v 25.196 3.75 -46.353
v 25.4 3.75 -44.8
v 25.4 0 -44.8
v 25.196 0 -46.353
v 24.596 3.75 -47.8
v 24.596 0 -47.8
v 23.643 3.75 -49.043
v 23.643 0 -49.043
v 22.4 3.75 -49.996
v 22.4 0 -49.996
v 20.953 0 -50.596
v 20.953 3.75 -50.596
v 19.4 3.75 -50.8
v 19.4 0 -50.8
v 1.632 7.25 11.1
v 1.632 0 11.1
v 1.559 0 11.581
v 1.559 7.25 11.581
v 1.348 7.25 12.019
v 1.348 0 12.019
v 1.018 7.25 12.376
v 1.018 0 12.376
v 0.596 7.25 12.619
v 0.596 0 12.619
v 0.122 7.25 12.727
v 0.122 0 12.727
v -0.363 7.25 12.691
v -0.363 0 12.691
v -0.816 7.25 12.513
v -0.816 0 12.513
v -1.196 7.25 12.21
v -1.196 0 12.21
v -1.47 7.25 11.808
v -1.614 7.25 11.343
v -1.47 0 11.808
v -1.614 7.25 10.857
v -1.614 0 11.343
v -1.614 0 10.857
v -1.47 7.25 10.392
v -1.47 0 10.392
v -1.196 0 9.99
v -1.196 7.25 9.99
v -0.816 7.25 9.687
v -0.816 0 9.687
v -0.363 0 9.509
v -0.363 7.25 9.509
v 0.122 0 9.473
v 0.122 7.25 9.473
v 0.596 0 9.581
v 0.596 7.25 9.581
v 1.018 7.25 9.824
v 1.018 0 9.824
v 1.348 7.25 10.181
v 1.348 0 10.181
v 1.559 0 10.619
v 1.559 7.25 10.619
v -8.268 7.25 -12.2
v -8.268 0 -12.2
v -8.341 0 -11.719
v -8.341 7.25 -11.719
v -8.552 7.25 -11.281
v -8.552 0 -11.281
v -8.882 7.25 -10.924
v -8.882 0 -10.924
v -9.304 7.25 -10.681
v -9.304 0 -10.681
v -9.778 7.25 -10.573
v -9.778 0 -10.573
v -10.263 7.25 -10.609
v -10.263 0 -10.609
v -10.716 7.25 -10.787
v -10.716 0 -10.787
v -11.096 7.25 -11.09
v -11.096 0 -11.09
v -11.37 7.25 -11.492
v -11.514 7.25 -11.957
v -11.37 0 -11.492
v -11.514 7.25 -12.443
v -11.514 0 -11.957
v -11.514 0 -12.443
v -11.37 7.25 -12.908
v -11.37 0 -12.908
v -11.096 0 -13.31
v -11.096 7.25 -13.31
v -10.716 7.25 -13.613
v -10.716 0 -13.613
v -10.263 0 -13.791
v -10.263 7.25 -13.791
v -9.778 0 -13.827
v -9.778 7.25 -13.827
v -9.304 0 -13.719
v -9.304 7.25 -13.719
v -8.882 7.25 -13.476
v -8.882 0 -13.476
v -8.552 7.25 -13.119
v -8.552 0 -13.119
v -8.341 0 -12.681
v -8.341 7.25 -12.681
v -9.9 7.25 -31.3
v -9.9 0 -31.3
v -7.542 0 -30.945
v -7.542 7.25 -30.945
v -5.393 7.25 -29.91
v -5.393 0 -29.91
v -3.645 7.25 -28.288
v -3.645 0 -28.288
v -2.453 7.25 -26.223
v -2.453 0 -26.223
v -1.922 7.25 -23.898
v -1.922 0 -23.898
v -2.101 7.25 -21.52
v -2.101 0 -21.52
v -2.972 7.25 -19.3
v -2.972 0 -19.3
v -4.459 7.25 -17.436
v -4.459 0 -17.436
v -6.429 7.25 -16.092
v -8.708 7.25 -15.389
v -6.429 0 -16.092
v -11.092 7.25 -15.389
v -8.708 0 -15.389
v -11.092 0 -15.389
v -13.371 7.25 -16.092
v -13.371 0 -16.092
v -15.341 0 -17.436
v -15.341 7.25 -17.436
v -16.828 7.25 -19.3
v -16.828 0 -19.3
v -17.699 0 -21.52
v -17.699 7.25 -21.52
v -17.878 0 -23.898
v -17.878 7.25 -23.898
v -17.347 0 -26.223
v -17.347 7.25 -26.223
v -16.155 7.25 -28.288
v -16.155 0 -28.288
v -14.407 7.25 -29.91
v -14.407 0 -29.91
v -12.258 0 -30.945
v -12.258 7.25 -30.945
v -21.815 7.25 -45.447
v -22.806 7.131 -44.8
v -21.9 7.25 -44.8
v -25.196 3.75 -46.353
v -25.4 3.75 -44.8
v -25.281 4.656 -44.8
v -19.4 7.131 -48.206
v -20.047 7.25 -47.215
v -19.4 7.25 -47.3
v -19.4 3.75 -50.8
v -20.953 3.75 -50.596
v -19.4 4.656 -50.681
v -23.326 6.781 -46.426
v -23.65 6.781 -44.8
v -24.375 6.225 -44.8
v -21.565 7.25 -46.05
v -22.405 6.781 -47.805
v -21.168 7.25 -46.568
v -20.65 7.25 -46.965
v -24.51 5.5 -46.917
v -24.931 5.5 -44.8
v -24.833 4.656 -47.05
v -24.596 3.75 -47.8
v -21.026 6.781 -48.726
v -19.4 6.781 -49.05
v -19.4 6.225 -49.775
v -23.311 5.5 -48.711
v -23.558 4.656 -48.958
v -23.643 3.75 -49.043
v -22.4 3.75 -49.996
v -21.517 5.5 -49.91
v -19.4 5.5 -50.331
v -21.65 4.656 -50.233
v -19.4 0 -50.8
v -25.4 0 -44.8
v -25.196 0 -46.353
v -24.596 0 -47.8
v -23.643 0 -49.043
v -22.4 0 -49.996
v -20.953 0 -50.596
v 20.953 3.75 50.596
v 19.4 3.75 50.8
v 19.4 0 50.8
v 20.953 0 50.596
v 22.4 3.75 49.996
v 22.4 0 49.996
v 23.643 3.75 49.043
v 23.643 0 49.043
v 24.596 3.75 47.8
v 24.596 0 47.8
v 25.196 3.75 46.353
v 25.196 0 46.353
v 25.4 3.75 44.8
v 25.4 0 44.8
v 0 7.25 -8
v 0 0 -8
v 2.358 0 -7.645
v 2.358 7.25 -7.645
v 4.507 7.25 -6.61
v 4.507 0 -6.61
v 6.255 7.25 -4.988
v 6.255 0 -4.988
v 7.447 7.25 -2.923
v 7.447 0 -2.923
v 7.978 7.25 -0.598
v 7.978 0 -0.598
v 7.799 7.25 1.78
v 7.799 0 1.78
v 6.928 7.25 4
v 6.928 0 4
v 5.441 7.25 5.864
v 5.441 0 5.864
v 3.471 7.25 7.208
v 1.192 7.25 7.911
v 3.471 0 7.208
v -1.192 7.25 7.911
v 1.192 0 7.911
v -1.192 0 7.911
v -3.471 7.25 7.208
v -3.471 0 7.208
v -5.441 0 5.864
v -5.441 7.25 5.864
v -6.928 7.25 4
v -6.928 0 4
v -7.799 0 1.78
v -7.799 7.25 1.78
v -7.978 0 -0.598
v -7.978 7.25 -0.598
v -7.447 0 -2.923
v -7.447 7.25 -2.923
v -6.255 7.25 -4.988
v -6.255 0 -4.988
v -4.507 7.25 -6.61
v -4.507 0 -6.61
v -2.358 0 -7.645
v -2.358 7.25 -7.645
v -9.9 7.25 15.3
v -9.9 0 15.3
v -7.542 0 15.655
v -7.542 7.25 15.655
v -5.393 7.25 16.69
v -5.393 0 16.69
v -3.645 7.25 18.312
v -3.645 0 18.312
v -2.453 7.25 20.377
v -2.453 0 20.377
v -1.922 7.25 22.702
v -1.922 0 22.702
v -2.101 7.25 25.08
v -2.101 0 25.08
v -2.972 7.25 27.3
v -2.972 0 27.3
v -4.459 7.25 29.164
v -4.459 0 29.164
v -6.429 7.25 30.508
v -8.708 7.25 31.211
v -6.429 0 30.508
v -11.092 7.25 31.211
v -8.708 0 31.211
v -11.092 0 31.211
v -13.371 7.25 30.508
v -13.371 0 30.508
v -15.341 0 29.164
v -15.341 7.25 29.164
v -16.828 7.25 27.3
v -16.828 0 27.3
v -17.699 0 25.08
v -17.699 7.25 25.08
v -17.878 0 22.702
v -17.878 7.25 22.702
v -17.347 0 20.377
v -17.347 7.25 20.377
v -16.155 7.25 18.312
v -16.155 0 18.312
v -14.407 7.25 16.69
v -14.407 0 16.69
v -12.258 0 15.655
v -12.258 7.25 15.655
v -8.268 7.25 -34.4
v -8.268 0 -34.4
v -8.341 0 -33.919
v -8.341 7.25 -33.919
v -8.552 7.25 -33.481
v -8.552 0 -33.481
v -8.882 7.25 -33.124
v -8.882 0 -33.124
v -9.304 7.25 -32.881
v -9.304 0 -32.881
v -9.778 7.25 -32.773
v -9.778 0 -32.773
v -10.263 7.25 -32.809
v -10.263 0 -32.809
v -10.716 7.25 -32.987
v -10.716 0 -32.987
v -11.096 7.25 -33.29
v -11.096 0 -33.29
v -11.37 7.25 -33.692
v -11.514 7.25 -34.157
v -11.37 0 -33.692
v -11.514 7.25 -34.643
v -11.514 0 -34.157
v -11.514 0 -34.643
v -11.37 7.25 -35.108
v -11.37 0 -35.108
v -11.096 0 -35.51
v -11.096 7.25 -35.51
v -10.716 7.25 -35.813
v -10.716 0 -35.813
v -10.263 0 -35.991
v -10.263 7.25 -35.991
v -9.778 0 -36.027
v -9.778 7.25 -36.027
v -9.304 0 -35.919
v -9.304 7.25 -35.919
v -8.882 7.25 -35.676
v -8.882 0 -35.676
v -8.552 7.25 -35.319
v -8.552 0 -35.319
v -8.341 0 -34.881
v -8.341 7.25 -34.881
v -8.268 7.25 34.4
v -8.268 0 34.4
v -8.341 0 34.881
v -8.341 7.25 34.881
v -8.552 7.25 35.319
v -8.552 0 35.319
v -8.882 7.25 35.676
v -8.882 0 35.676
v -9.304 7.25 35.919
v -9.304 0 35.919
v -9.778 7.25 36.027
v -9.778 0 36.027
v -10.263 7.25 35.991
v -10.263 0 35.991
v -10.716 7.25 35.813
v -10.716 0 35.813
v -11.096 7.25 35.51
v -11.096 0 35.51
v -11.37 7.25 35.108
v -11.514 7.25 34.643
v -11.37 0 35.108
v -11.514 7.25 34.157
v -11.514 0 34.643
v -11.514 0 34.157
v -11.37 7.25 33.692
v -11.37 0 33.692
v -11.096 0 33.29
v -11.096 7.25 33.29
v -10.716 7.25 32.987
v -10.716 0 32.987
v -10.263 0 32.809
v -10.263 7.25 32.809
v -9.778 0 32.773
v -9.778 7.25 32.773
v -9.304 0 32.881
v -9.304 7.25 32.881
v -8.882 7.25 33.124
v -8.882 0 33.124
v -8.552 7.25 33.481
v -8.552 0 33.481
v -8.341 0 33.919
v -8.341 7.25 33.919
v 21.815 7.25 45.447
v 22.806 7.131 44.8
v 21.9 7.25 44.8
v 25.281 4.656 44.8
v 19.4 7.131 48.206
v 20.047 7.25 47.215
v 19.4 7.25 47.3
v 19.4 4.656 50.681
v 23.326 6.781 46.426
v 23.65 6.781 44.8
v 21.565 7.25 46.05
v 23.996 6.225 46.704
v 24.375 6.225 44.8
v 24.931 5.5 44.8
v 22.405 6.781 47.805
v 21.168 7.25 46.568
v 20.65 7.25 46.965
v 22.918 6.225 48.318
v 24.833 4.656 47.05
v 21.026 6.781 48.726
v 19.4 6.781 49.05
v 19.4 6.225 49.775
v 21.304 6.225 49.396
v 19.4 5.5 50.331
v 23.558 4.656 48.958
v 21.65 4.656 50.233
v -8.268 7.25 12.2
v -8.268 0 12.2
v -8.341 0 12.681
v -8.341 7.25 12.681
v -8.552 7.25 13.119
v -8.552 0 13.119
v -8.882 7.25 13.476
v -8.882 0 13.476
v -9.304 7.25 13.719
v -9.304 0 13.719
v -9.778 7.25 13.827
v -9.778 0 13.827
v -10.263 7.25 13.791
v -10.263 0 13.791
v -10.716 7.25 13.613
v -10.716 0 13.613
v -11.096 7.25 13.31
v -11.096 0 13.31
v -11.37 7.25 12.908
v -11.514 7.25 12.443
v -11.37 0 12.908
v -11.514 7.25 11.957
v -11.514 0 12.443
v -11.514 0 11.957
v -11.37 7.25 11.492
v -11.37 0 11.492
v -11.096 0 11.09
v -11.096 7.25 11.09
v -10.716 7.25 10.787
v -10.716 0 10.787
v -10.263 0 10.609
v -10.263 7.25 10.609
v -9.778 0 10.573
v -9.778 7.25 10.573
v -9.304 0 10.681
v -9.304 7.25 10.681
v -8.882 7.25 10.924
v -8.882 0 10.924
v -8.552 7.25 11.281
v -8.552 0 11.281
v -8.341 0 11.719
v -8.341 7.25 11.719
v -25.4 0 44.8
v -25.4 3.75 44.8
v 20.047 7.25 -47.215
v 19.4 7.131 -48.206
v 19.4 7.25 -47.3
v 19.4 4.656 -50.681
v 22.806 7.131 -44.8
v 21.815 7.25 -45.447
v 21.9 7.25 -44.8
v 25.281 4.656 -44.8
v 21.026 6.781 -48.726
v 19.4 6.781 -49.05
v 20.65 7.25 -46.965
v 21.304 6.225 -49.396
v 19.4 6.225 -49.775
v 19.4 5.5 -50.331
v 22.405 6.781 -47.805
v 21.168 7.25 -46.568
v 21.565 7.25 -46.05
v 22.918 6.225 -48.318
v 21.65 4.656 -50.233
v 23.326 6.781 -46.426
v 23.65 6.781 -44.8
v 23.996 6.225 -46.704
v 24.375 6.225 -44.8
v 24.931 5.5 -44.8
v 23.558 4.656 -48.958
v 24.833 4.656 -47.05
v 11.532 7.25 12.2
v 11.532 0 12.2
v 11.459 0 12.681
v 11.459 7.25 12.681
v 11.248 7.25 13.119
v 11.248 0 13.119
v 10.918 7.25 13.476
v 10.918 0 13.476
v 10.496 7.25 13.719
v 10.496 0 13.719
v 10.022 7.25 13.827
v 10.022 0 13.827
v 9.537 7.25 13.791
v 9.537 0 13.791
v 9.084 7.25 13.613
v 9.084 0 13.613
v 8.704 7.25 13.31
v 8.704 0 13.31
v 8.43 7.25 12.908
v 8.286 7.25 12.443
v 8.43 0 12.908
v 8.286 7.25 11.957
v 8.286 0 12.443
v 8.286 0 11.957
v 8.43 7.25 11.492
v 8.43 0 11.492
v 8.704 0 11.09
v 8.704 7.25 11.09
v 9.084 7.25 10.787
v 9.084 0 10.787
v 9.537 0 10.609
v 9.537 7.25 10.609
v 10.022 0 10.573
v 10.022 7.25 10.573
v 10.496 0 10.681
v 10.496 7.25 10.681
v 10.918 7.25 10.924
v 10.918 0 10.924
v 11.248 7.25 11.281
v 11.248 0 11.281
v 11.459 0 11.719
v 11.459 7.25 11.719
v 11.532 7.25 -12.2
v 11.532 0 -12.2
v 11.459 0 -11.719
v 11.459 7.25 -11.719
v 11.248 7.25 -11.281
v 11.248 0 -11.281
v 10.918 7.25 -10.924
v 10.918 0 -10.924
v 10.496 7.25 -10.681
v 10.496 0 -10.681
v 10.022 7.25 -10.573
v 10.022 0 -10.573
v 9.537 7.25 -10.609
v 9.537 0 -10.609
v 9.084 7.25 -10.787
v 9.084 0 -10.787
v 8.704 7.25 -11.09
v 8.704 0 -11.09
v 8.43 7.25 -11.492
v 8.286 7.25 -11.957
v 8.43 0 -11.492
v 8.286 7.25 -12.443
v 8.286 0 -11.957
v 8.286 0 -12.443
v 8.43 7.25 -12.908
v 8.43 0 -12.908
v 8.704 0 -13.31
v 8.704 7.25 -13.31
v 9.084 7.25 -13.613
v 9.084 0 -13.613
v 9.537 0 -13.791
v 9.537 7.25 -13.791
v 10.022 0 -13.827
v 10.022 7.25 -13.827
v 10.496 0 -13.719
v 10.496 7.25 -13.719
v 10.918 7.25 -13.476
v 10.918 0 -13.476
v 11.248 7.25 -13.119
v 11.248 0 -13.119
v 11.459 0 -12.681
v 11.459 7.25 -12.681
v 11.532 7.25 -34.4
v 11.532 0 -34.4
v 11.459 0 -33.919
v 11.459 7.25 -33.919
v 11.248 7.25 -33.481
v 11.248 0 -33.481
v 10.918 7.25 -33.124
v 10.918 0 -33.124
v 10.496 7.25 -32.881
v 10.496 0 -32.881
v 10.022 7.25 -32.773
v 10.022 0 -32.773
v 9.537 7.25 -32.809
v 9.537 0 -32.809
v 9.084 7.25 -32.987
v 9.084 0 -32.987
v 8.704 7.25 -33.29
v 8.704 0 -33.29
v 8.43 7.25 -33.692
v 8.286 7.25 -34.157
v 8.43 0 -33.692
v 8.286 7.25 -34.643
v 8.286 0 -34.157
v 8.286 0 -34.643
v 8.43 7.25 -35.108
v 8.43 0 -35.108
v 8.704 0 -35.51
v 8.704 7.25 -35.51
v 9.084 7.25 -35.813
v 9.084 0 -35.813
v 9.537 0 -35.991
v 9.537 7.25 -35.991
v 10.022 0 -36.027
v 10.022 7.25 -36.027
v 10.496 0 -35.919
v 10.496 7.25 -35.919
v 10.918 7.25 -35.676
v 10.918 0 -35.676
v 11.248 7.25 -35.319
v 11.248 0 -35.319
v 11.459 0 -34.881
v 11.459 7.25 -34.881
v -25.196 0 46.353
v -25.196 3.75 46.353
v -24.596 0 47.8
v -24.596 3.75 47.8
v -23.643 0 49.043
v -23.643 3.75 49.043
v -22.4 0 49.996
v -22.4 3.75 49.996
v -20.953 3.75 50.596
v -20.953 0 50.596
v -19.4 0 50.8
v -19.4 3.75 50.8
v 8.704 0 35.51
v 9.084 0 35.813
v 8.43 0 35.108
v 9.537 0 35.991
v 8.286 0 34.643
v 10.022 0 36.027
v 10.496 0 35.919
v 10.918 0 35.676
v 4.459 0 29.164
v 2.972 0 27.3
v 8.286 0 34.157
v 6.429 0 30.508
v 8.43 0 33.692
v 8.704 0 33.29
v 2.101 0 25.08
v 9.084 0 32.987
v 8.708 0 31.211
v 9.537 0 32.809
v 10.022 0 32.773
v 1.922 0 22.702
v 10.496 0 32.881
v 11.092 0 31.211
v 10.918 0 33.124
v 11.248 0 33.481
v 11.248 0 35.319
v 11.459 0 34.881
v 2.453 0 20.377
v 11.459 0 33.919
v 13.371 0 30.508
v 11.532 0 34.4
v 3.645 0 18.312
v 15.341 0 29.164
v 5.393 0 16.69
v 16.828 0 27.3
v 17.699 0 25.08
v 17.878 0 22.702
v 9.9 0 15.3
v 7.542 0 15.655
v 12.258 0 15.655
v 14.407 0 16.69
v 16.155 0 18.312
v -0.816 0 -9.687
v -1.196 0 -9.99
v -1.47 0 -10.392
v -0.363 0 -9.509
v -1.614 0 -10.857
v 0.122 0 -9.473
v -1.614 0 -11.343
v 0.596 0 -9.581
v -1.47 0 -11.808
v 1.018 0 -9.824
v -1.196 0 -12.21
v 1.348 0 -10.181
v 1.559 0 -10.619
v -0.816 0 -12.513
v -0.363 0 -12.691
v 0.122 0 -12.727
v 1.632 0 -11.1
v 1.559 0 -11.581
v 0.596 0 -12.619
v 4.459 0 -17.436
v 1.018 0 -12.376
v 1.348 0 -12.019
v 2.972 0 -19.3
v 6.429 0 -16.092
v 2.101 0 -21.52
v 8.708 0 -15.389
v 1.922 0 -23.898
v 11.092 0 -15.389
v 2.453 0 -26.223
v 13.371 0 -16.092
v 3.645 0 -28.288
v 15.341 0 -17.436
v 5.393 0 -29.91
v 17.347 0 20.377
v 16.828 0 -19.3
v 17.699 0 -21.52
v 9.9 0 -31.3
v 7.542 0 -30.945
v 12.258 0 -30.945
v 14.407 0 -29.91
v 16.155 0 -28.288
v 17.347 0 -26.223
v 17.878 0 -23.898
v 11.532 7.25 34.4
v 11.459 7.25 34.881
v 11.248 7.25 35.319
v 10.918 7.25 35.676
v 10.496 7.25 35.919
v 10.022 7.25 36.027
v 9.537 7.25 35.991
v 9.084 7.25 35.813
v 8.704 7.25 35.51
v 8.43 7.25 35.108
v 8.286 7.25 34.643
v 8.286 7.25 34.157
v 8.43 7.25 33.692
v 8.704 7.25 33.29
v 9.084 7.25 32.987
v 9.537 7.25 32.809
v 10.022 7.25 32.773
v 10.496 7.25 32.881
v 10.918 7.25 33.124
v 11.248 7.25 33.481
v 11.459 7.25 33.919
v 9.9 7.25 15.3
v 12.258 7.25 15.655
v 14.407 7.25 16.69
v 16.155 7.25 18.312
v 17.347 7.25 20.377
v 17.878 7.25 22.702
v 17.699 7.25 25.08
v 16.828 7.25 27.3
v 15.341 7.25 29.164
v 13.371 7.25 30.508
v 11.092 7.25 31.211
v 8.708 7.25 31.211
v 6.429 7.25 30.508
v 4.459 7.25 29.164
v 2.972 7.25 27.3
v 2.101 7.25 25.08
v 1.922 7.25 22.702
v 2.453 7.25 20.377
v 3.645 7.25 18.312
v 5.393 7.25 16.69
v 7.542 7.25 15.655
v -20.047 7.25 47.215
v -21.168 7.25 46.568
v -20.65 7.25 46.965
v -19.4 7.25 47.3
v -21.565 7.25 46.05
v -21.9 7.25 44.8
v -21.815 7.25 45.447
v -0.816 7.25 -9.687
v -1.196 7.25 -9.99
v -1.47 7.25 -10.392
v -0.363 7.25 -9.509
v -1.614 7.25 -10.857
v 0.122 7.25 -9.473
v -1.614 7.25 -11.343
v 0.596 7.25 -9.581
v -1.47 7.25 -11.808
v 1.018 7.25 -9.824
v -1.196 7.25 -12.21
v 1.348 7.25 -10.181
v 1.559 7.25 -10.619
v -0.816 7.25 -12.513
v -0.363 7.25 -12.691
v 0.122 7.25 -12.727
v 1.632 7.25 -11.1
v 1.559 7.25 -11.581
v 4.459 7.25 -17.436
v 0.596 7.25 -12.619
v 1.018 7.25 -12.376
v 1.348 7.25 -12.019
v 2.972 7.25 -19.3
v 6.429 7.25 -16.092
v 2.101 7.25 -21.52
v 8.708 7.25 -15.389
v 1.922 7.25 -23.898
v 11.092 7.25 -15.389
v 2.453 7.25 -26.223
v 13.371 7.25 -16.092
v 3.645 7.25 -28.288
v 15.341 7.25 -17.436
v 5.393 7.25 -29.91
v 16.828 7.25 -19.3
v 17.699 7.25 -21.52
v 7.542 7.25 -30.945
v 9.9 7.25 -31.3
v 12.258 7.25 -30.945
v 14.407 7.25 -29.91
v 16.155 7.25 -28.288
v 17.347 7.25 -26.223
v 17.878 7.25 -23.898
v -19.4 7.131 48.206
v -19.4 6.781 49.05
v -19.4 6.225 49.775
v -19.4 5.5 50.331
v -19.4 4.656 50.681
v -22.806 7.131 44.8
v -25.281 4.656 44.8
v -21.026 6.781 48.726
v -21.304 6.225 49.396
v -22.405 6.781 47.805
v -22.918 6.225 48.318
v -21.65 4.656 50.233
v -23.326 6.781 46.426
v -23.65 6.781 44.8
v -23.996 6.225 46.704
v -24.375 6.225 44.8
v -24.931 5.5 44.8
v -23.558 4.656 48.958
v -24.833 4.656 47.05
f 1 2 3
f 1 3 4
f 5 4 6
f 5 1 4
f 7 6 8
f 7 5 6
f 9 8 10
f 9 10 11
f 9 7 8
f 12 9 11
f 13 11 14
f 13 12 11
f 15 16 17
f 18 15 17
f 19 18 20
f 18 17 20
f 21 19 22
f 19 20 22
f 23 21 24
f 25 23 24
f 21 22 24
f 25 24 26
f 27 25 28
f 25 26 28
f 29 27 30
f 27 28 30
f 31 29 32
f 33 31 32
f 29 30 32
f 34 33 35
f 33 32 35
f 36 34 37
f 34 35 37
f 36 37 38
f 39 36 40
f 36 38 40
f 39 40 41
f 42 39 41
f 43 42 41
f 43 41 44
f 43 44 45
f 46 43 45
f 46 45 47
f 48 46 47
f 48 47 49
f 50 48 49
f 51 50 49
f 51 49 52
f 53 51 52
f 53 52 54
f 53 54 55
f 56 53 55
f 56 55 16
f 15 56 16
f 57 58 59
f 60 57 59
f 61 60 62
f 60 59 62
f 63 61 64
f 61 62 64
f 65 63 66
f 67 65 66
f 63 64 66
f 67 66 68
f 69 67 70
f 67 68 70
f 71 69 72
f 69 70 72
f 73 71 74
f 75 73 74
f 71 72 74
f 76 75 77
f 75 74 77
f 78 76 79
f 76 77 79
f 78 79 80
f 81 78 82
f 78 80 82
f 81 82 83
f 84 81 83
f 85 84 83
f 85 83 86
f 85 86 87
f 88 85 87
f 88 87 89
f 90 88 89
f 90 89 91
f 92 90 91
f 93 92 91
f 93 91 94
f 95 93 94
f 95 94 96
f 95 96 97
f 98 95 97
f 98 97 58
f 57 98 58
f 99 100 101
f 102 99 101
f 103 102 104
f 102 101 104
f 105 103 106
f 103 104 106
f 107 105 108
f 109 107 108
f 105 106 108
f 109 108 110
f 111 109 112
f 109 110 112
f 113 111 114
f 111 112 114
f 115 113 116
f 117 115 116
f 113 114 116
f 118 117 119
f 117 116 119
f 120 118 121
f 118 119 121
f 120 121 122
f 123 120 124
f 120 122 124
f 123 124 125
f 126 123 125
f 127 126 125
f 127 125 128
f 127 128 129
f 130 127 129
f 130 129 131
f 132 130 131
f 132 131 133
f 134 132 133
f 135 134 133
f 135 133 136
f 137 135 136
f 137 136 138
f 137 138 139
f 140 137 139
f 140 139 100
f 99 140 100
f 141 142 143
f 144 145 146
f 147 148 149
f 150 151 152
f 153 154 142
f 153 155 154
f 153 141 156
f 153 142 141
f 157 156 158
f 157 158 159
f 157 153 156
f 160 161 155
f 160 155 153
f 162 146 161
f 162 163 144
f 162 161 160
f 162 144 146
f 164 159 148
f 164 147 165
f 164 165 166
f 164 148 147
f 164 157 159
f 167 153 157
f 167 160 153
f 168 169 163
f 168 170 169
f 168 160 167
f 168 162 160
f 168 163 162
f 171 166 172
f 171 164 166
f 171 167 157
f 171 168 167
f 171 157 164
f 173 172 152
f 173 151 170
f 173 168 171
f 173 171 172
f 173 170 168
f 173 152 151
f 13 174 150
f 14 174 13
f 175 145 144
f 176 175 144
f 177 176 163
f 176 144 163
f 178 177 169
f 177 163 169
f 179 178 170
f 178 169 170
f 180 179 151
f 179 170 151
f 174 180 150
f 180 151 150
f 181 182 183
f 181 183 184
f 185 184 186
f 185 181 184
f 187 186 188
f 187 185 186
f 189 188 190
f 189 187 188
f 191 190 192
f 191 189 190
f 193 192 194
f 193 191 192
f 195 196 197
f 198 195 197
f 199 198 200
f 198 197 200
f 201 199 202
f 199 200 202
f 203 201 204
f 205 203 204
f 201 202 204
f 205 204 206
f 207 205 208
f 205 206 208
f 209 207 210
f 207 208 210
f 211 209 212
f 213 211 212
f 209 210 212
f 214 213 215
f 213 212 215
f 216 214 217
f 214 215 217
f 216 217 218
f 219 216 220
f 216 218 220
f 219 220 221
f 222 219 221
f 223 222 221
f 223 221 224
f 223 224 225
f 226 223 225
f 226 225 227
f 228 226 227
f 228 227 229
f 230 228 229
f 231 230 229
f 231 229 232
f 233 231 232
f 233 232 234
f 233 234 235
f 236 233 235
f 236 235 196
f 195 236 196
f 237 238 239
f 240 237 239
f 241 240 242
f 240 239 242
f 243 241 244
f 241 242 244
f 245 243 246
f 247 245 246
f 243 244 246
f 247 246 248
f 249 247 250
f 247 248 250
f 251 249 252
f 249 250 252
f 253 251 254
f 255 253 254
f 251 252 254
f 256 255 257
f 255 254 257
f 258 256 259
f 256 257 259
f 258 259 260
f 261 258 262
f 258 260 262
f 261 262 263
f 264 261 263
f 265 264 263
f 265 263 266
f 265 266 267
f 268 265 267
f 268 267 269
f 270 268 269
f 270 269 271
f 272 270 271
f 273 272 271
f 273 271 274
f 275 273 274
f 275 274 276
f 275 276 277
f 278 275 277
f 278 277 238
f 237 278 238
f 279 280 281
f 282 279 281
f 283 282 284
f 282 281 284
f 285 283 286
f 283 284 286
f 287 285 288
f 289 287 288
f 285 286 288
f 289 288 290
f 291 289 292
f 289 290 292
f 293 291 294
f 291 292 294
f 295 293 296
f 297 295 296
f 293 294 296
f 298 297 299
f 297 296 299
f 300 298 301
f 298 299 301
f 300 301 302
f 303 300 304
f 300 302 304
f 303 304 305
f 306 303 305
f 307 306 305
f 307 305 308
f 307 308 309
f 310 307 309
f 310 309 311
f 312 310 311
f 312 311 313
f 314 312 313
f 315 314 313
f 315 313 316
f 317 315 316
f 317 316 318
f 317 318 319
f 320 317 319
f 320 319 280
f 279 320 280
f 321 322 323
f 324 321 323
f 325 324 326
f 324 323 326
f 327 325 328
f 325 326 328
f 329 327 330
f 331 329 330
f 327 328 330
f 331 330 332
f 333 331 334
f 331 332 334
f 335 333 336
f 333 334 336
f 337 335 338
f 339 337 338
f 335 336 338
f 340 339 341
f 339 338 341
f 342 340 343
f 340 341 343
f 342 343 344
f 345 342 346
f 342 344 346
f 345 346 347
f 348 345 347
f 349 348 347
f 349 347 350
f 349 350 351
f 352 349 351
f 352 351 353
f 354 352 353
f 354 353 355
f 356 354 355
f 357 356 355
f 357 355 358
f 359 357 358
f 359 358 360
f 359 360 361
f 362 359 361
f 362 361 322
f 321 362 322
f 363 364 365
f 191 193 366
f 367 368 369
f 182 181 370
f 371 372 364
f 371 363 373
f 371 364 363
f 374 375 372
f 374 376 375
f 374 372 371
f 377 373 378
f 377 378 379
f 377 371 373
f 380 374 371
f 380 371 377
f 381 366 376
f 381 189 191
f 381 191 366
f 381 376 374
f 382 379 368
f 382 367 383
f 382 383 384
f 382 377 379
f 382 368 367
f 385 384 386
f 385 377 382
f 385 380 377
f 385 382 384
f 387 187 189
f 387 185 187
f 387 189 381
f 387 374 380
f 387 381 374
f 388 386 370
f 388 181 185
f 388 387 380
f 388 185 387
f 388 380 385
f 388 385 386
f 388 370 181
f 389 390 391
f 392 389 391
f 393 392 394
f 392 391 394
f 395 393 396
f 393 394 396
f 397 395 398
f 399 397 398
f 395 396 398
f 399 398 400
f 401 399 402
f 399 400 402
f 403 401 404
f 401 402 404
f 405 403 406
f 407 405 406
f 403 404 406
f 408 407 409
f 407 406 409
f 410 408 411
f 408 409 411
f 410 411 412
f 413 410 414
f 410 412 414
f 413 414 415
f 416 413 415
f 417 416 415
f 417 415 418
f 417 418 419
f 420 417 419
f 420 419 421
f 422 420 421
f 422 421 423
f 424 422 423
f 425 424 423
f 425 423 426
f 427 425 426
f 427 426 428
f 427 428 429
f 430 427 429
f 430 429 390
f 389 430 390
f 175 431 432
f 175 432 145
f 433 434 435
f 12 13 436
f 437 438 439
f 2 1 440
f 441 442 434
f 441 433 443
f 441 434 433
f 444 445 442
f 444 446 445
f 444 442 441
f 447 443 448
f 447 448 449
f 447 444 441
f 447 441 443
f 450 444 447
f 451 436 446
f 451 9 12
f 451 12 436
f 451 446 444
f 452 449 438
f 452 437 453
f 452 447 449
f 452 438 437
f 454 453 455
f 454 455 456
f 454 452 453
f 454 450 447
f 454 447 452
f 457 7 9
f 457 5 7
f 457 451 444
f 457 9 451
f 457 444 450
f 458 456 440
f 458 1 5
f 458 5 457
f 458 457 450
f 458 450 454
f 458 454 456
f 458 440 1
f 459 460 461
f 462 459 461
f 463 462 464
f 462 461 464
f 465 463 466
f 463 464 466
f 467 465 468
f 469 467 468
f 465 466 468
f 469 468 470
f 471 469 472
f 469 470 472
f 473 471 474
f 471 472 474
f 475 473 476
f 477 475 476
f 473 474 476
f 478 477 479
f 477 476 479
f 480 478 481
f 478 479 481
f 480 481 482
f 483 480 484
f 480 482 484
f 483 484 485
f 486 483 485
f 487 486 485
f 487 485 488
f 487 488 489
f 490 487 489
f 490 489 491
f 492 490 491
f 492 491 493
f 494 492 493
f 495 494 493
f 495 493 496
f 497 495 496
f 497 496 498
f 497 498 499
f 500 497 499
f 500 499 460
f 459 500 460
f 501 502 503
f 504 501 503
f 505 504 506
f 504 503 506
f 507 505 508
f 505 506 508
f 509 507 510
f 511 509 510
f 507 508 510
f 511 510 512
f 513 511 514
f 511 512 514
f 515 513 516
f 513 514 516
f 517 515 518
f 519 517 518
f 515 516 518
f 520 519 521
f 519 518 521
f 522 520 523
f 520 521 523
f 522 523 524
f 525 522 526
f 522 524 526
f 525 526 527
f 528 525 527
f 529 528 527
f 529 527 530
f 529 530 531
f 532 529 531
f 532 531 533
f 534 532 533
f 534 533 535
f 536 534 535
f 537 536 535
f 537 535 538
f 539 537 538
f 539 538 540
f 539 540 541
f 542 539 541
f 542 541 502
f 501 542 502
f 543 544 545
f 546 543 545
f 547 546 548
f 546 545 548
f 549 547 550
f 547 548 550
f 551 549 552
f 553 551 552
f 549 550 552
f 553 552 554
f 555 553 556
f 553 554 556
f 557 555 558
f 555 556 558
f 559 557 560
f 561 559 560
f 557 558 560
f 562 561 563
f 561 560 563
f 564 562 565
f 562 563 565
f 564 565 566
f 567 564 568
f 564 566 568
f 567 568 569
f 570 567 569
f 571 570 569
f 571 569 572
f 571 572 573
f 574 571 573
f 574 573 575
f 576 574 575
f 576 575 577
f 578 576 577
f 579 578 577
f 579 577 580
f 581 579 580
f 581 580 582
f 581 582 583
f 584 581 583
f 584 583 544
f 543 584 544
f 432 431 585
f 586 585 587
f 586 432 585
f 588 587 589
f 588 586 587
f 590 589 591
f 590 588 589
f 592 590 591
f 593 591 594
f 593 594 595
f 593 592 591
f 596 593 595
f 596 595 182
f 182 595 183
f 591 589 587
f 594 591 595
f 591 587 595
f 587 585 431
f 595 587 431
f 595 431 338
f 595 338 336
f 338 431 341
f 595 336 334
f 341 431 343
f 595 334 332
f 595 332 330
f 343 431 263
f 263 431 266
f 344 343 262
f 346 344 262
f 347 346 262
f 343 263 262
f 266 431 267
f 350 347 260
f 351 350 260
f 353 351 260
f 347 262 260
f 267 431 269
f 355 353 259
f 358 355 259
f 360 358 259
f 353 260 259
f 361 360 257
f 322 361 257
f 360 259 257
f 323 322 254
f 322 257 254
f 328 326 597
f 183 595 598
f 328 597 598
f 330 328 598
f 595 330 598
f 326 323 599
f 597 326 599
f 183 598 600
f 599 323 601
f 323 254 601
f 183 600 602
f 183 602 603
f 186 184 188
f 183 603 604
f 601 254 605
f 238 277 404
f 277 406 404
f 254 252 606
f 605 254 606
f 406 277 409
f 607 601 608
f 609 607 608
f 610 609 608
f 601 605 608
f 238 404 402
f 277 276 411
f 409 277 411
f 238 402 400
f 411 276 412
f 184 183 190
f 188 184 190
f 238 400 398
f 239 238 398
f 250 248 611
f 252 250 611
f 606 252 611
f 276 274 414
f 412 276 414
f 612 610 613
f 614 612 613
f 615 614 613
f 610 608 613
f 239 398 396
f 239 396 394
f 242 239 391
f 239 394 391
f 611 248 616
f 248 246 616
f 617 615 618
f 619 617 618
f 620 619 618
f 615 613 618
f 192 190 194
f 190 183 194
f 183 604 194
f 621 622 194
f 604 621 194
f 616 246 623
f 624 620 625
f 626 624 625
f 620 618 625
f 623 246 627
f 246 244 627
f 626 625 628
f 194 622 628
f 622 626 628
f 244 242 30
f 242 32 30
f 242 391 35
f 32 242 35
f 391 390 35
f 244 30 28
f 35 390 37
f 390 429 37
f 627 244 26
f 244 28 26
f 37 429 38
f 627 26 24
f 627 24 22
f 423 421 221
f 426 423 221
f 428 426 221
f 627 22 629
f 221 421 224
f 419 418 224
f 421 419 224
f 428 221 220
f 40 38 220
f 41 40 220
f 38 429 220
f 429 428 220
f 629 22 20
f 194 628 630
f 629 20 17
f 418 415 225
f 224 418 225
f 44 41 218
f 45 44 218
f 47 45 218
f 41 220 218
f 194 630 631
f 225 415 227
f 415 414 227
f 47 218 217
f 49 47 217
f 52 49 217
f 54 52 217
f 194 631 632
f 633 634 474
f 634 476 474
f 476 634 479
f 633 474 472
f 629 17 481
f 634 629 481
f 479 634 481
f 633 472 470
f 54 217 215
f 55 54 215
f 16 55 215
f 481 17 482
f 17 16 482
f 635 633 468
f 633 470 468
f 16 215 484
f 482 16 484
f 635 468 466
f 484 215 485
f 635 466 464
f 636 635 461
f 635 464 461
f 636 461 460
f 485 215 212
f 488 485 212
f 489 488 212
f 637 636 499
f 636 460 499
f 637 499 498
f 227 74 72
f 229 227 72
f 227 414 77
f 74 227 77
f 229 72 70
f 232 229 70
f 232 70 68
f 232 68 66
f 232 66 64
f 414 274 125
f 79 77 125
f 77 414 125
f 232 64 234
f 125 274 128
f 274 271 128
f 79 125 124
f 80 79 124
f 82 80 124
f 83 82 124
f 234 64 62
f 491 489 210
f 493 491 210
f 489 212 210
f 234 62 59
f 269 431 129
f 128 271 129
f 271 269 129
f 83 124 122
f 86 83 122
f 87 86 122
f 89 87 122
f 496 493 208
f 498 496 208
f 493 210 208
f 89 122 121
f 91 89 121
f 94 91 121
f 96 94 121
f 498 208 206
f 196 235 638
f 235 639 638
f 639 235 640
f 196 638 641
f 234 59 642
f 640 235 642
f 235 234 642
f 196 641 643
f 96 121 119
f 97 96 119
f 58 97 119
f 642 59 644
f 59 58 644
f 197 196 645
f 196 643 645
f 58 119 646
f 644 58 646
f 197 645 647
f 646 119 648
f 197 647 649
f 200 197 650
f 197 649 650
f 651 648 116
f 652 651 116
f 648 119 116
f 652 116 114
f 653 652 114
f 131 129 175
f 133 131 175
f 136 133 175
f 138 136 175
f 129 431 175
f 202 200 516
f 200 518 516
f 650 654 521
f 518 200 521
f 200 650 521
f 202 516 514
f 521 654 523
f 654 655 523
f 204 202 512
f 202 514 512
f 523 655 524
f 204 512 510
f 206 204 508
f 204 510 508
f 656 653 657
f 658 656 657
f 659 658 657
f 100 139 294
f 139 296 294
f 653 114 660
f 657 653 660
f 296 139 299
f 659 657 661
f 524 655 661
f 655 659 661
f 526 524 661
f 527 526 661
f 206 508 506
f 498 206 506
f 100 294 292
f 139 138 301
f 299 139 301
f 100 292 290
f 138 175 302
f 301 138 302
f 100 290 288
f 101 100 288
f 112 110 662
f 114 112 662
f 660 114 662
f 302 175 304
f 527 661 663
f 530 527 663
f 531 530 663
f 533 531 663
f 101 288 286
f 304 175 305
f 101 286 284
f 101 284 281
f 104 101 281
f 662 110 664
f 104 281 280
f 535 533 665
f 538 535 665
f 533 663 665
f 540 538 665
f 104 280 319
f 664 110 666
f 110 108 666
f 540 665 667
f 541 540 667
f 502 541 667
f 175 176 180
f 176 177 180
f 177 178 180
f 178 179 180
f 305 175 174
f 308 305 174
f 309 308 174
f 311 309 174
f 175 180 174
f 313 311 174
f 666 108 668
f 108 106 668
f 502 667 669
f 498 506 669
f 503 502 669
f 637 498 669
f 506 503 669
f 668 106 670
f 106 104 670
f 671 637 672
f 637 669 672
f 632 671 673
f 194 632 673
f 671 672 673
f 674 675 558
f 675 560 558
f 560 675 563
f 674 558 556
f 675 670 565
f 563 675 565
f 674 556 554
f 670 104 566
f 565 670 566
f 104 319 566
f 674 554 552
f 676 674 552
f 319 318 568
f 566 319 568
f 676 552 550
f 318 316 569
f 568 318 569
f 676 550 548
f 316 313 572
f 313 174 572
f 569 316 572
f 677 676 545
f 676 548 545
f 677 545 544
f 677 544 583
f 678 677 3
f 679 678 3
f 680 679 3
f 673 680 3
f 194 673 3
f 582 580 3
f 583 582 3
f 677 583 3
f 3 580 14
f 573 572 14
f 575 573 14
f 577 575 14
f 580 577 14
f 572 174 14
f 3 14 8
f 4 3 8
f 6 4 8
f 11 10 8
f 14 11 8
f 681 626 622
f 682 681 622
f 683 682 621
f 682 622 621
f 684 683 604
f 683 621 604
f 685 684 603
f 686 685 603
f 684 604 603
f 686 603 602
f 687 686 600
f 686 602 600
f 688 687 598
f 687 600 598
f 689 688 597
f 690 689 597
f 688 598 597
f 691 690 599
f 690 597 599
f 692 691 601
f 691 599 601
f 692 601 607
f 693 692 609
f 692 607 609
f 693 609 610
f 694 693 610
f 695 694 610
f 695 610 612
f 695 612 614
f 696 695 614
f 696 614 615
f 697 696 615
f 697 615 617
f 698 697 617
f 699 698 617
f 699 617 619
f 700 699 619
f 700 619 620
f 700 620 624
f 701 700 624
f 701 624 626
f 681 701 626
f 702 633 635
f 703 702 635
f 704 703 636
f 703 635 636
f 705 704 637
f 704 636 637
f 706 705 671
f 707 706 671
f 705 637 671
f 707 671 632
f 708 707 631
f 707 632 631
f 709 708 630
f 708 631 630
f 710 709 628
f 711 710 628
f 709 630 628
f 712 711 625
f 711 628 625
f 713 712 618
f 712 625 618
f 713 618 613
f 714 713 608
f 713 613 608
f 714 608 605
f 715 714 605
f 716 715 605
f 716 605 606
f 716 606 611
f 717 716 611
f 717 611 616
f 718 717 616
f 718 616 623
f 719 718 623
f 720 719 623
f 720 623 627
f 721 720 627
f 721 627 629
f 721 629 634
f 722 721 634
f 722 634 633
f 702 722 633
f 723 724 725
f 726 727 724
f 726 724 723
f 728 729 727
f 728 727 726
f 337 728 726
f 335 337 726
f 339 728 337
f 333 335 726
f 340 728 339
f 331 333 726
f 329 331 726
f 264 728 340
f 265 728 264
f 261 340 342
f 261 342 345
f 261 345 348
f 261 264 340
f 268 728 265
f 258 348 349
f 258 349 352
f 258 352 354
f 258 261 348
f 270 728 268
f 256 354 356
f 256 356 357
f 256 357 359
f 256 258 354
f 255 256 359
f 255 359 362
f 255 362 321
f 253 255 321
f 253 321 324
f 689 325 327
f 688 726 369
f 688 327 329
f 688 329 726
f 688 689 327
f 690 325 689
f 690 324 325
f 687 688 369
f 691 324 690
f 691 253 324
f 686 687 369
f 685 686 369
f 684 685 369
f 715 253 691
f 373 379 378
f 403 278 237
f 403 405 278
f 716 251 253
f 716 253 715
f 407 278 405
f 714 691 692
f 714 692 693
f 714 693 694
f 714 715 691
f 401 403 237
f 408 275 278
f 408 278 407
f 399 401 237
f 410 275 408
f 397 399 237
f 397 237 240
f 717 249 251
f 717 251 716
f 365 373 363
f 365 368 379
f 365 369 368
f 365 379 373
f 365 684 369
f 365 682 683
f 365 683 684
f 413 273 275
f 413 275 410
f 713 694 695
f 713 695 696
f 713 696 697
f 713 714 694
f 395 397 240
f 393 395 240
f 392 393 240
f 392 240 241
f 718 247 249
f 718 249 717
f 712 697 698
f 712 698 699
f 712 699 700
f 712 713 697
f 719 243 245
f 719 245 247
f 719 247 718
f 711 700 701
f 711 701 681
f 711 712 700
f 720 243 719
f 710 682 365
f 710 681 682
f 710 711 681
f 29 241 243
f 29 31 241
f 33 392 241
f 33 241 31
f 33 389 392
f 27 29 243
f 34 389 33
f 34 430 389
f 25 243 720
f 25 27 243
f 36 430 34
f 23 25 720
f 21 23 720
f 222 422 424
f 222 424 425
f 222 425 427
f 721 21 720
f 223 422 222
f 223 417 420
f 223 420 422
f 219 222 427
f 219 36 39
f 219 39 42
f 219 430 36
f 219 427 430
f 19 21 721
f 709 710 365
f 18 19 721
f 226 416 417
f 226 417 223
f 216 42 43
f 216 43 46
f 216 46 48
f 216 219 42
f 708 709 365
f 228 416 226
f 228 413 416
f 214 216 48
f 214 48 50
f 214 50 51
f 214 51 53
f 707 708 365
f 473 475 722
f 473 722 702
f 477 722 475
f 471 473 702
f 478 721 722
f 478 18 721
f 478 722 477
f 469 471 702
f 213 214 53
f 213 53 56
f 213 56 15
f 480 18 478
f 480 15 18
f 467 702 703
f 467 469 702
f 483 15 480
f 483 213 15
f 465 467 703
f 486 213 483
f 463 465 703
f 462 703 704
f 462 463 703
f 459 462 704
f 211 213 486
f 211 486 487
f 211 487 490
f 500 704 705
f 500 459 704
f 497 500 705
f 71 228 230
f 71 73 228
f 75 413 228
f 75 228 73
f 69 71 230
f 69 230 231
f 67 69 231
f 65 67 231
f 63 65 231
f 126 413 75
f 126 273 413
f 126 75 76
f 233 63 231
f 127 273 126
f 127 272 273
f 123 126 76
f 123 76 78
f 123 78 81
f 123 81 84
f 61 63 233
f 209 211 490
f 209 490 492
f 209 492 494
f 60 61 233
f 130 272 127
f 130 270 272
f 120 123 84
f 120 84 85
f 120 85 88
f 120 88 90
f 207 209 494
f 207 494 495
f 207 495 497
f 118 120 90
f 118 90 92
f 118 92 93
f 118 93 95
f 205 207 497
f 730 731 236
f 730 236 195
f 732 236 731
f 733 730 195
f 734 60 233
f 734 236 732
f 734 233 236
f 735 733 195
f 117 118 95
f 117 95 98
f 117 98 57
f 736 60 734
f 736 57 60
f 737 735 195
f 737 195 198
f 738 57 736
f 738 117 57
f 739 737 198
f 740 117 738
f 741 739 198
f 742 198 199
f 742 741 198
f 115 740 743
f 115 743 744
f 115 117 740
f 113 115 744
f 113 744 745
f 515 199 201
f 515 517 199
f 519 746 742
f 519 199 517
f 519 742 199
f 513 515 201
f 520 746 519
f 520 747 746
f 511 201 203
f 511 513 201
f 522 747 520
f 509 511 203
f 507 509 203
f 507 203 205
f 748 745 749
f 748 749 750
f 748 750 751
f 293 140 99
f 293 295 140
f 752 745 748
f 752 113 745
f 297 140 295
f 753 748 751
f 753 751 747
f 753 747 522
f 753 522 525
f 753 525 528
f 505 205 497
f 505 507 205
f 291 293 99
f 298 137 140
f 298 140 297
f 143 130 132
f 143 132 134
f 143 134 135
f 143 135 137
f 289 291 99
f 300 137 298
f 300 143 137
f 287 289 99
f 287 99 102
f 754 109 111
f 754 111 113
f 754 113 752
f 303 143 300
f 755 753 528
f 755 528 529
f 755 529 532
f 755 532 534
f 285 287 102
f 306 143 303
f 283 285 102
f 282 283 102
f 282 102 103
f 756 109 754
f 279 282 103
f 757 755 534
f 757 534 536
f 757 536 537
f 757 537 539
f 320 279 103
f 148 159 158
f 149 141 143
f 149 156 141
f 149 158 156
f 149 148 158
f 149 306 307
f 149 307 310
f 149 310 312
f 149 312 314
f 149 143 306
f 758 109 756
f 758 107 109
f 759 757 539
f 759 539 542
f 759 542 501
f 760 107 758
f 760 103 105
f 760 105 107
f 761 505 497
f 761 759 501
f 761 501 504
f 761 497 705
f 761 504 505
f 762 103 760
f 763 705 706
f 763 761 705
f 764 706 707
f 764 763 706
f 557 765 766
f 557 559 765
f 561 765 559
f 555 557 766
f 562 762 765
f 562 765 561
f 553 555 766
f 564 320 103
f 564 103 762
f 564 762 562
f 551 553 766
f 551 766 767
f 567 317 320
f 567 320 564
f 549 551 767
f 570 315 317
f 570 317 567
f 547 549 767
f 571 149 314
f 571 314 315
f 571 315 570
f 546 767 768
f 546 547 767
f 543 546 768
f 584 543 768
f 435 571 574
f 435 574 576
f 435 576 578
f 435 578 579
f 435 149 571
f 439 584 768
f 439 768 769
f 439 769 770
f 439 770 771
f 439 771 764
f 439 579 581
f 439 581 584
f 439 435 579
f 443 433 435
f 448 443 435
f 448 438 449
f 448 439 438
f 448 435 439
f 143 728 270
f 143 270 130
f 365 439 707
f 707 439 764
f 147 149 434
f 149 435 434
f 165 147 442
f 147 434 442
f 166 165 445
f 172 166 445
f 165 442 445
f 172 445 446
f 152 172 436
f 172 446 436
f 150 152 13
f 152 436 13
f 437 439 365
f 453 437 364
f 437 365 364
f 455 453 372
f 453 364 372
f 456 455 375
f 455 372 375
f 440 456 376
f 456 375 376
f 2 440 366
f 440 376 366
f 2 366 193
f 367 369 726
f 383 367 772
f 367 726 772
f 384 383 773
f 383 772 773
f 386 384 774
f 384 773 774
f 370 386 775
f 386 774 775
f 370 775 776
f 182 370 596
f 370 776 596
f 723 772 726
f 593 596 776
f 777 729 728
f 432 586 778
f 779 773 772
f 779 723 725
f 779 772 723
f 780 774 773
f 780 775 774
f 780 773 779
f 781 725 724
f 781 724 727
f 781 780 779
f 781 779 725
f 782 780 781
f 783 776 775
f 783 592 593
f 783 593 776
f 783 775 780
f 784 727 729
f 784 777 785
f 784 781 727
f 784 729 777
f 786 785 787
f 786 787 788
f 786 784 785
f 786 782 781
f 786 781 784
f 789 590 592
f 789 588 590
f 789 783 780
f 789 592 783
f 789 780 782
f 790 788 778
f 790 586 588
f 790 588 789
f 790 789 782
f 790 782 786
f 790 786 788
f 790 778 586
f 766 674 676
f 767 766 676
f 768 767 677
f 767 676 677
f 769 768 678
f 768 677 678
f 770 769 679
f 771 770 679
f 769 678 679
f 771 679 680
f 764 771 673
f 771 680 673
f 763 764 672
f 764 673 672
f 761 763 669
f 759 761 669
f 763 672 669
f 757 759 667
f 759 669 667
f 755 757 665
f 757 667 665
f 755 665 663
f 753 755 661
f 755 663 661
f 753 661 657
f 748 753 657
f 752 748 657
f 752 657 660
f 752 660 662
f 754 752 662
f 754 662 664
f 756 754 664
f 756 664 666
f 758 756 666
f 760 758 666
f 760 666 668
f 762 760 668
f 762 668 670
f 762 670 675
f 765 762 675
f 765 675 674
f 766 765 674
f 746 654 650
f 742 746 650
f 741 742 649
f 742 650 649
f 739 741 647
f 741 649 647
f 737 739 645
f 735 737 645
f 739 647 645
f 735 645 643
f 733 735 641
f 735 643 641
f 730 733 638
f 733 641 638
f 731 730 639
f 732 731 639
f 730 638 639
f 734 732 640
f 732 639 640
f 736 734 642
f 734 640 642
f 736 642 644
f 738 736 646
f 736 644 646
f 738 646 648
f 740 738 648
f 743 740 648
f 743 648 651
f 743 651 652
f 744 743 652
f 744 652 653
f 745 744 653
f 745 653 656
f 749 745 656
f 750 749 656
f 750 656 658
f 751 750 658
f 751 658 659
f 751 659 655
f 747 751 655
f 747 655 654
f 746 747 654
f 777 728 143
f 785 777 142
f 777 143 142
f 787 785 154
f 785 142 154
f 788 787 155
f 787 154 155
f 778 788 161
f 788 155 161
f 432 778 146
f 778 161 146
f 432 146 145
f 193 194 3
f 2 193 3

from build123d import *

# Parameters (mm, degrees)
SKETCH1_W             = 50.8
SKETCH1_H             = 101.6
BOSS_EXTRUDE1_DEPTH   = 7.25
FILLET1_R             = 6
FILLET2_R             = 3.5
CUT_EXTRUDE1_REACH    = 59.257
SKETCH2_R             = 8
F_4_CLEARANCE_HOLE1_D = 3.2639


with BuildPart() as part:
    # Sketch1 → Boss-Extrude1 (new body)
    with BuildSketch(Plane(origin=(0, 0, 0), x_dir=(1, 0, 0), z_dir=(0, 1, 0))):
        Rectangle(SKETCH1_W, SKETCH1_H)
    extrude(amount=BOSS_EXTRUDE1_DEPTH)

    # Fillet1
    fillet1_edges = [part.edges().sort_by_distance(p)[0] for p in [
        (25.4, 3.625, 50.8),
        (-25.4, 3.625, 50.8),
        (-25.4, 3.625, -50.8),
        (25.4, 3.625, -50.8),
    ]]
    fillet(fillet1_edges, radius=FILLET1_R)

    # Fillet2
    fillet2_edges = [part.edges().sort_by_distance(p)[0] for p in [
        (0, 7.25, -50.8),
        (25.4, 7.25, 0),
        (-25.4, 7.25, 0),
        (0, 7.25, 50.8),
        (23.642640687, 7.25, 49.042640687),
        (-23.642640687, 7.25, 49.042640687),
        (-23.642640687, 7.25, -49.042640687),
        (23.642640687, 7.25, -49.042640687),
    ]]
    fillet(fillet2_edges, radius=FILLET2_R)

    # Sketch2 → Cut-Extrude1 (cut, up to next)
    with BuildSketch(Plane.XZ, mode=Mode.PRIVATE) as cut_extrude1_sk1:
        with Locations(Location((0, 0, 0), (0, 0, 270))):
            Circle(SKETCH2_R)
    cut_extrude1_tool1 = extrude(cut_extrude1_sk1.sketch, amount=-CUT_EXTRUDE1_REACH, mode=Mode.PRIVATE) & part.part
    # Sketch2 → Cut-Extrude1 (cut, up to next)
    with BuildSketch(Plane.XZ, mode=Mode.PRIVATE) as cut_extrude1_sk2:
        with Locations(Location((9.9, 23.3, 0), (0, 0, 270))):
            Circle(SKETCH2_R)
    cut_extrude1_tool2 = extrude(cut_extrude1_sk2.sketch, amount=-CUT_EXTRUDE1_REACH, mode=Mode.PRIVATE) & part.part
    # Sketch2 → Cut-Extrude1 (cut, up to next)
    with BuildSketch(Plane.XZ, mode=Mode.PRIVATE) as cut_extrude1_sk3:
        with Locations(Location((-9.9, 23.3, 0), (0, 0, 270))):
            Circle(SKETCH2_R)
    cut_extrude1_tool3 = extrude(cut_extrude1_sk3.sketch, amount=-CUT_EXTRUDE1_REACH, mode=Mode.PRIVATE) & part.part
    # Sketch2 → Cut-Extrude1 (cut, up to next)
    with BuildSketch(Plane.XZ, mode=Mode.PRIVATE) as cut_extrude1_sk4:
        with Locations(Location((9.9, -23.3, 0), (0, 0, 270))):
            Circle(SKETCH2_R)
    cut_extrude1_tool4 = extrude(cut_extrude1_sk4.sketch, amount=-CUT_EXTRUDE1_REACH, mode=Mode.PRIVATE) & part.part
    # Sketch2 → Cut-Extrude1 (cut, up to next)
    with BuildSketch(Plane.XZ, mode=Mode.PRIVATE) as cut_extrude1_sk5:
        with Locations(Location((-9.9, -23.3, 0), (0, 0, 270))):
            Circle(SKETCH2_R)
    cut_extrude1_tool5 = extrude(cut_extrude1_sk5.sketch, amount=-CUT_EXTRUDE1_REACH, mode=Mode.PRIVATE) & part.part
    add(cut_extrude1_tool1.solids().sort_by_distance((0, 0, 0))[0], mode=Mode.SUBTRACT)
    add(cut_extrude1_tool2.solids().sort_by_distance((9.9, 0, 23.3))[0], mode=Mode.SUBTRACT)
    add(cut_extrude1_tool3.solids().sort_by_distance((-9.9, 0, 23.3))[0], mode=Mode.SUBTRACT)
    add(cut_extrude1_tool4.solids().sort_by_distance((9.9, 0, -23.3))[0], mode=Mode.SUBTRACT)
    add(cut_extrude1_tool5.solids().sort_by_distance((-9.9, 0, -23.3))[0], mode=Mode.SUBTRACT)

    # #4 Clearance Hole1 (through all)
    with Locations(Plane(origin=(0, 7.25, 0), x_dir=(-1, 0, 0), z_dir=(0, 1, 0))):
        with Locations((-9.9, 12.2), (-9.9, 34.4), (9.9, 34.4), (9.9, 12.2), (0, 11.1), (0, -11.1), (9.9, -12.2), (-9.9, -12.2), (9.9, -34.4), (-9.9, -34.4)):
            Hole(F_4_CLEARANCE_HOLE1_D / 2)


solid = part.part
